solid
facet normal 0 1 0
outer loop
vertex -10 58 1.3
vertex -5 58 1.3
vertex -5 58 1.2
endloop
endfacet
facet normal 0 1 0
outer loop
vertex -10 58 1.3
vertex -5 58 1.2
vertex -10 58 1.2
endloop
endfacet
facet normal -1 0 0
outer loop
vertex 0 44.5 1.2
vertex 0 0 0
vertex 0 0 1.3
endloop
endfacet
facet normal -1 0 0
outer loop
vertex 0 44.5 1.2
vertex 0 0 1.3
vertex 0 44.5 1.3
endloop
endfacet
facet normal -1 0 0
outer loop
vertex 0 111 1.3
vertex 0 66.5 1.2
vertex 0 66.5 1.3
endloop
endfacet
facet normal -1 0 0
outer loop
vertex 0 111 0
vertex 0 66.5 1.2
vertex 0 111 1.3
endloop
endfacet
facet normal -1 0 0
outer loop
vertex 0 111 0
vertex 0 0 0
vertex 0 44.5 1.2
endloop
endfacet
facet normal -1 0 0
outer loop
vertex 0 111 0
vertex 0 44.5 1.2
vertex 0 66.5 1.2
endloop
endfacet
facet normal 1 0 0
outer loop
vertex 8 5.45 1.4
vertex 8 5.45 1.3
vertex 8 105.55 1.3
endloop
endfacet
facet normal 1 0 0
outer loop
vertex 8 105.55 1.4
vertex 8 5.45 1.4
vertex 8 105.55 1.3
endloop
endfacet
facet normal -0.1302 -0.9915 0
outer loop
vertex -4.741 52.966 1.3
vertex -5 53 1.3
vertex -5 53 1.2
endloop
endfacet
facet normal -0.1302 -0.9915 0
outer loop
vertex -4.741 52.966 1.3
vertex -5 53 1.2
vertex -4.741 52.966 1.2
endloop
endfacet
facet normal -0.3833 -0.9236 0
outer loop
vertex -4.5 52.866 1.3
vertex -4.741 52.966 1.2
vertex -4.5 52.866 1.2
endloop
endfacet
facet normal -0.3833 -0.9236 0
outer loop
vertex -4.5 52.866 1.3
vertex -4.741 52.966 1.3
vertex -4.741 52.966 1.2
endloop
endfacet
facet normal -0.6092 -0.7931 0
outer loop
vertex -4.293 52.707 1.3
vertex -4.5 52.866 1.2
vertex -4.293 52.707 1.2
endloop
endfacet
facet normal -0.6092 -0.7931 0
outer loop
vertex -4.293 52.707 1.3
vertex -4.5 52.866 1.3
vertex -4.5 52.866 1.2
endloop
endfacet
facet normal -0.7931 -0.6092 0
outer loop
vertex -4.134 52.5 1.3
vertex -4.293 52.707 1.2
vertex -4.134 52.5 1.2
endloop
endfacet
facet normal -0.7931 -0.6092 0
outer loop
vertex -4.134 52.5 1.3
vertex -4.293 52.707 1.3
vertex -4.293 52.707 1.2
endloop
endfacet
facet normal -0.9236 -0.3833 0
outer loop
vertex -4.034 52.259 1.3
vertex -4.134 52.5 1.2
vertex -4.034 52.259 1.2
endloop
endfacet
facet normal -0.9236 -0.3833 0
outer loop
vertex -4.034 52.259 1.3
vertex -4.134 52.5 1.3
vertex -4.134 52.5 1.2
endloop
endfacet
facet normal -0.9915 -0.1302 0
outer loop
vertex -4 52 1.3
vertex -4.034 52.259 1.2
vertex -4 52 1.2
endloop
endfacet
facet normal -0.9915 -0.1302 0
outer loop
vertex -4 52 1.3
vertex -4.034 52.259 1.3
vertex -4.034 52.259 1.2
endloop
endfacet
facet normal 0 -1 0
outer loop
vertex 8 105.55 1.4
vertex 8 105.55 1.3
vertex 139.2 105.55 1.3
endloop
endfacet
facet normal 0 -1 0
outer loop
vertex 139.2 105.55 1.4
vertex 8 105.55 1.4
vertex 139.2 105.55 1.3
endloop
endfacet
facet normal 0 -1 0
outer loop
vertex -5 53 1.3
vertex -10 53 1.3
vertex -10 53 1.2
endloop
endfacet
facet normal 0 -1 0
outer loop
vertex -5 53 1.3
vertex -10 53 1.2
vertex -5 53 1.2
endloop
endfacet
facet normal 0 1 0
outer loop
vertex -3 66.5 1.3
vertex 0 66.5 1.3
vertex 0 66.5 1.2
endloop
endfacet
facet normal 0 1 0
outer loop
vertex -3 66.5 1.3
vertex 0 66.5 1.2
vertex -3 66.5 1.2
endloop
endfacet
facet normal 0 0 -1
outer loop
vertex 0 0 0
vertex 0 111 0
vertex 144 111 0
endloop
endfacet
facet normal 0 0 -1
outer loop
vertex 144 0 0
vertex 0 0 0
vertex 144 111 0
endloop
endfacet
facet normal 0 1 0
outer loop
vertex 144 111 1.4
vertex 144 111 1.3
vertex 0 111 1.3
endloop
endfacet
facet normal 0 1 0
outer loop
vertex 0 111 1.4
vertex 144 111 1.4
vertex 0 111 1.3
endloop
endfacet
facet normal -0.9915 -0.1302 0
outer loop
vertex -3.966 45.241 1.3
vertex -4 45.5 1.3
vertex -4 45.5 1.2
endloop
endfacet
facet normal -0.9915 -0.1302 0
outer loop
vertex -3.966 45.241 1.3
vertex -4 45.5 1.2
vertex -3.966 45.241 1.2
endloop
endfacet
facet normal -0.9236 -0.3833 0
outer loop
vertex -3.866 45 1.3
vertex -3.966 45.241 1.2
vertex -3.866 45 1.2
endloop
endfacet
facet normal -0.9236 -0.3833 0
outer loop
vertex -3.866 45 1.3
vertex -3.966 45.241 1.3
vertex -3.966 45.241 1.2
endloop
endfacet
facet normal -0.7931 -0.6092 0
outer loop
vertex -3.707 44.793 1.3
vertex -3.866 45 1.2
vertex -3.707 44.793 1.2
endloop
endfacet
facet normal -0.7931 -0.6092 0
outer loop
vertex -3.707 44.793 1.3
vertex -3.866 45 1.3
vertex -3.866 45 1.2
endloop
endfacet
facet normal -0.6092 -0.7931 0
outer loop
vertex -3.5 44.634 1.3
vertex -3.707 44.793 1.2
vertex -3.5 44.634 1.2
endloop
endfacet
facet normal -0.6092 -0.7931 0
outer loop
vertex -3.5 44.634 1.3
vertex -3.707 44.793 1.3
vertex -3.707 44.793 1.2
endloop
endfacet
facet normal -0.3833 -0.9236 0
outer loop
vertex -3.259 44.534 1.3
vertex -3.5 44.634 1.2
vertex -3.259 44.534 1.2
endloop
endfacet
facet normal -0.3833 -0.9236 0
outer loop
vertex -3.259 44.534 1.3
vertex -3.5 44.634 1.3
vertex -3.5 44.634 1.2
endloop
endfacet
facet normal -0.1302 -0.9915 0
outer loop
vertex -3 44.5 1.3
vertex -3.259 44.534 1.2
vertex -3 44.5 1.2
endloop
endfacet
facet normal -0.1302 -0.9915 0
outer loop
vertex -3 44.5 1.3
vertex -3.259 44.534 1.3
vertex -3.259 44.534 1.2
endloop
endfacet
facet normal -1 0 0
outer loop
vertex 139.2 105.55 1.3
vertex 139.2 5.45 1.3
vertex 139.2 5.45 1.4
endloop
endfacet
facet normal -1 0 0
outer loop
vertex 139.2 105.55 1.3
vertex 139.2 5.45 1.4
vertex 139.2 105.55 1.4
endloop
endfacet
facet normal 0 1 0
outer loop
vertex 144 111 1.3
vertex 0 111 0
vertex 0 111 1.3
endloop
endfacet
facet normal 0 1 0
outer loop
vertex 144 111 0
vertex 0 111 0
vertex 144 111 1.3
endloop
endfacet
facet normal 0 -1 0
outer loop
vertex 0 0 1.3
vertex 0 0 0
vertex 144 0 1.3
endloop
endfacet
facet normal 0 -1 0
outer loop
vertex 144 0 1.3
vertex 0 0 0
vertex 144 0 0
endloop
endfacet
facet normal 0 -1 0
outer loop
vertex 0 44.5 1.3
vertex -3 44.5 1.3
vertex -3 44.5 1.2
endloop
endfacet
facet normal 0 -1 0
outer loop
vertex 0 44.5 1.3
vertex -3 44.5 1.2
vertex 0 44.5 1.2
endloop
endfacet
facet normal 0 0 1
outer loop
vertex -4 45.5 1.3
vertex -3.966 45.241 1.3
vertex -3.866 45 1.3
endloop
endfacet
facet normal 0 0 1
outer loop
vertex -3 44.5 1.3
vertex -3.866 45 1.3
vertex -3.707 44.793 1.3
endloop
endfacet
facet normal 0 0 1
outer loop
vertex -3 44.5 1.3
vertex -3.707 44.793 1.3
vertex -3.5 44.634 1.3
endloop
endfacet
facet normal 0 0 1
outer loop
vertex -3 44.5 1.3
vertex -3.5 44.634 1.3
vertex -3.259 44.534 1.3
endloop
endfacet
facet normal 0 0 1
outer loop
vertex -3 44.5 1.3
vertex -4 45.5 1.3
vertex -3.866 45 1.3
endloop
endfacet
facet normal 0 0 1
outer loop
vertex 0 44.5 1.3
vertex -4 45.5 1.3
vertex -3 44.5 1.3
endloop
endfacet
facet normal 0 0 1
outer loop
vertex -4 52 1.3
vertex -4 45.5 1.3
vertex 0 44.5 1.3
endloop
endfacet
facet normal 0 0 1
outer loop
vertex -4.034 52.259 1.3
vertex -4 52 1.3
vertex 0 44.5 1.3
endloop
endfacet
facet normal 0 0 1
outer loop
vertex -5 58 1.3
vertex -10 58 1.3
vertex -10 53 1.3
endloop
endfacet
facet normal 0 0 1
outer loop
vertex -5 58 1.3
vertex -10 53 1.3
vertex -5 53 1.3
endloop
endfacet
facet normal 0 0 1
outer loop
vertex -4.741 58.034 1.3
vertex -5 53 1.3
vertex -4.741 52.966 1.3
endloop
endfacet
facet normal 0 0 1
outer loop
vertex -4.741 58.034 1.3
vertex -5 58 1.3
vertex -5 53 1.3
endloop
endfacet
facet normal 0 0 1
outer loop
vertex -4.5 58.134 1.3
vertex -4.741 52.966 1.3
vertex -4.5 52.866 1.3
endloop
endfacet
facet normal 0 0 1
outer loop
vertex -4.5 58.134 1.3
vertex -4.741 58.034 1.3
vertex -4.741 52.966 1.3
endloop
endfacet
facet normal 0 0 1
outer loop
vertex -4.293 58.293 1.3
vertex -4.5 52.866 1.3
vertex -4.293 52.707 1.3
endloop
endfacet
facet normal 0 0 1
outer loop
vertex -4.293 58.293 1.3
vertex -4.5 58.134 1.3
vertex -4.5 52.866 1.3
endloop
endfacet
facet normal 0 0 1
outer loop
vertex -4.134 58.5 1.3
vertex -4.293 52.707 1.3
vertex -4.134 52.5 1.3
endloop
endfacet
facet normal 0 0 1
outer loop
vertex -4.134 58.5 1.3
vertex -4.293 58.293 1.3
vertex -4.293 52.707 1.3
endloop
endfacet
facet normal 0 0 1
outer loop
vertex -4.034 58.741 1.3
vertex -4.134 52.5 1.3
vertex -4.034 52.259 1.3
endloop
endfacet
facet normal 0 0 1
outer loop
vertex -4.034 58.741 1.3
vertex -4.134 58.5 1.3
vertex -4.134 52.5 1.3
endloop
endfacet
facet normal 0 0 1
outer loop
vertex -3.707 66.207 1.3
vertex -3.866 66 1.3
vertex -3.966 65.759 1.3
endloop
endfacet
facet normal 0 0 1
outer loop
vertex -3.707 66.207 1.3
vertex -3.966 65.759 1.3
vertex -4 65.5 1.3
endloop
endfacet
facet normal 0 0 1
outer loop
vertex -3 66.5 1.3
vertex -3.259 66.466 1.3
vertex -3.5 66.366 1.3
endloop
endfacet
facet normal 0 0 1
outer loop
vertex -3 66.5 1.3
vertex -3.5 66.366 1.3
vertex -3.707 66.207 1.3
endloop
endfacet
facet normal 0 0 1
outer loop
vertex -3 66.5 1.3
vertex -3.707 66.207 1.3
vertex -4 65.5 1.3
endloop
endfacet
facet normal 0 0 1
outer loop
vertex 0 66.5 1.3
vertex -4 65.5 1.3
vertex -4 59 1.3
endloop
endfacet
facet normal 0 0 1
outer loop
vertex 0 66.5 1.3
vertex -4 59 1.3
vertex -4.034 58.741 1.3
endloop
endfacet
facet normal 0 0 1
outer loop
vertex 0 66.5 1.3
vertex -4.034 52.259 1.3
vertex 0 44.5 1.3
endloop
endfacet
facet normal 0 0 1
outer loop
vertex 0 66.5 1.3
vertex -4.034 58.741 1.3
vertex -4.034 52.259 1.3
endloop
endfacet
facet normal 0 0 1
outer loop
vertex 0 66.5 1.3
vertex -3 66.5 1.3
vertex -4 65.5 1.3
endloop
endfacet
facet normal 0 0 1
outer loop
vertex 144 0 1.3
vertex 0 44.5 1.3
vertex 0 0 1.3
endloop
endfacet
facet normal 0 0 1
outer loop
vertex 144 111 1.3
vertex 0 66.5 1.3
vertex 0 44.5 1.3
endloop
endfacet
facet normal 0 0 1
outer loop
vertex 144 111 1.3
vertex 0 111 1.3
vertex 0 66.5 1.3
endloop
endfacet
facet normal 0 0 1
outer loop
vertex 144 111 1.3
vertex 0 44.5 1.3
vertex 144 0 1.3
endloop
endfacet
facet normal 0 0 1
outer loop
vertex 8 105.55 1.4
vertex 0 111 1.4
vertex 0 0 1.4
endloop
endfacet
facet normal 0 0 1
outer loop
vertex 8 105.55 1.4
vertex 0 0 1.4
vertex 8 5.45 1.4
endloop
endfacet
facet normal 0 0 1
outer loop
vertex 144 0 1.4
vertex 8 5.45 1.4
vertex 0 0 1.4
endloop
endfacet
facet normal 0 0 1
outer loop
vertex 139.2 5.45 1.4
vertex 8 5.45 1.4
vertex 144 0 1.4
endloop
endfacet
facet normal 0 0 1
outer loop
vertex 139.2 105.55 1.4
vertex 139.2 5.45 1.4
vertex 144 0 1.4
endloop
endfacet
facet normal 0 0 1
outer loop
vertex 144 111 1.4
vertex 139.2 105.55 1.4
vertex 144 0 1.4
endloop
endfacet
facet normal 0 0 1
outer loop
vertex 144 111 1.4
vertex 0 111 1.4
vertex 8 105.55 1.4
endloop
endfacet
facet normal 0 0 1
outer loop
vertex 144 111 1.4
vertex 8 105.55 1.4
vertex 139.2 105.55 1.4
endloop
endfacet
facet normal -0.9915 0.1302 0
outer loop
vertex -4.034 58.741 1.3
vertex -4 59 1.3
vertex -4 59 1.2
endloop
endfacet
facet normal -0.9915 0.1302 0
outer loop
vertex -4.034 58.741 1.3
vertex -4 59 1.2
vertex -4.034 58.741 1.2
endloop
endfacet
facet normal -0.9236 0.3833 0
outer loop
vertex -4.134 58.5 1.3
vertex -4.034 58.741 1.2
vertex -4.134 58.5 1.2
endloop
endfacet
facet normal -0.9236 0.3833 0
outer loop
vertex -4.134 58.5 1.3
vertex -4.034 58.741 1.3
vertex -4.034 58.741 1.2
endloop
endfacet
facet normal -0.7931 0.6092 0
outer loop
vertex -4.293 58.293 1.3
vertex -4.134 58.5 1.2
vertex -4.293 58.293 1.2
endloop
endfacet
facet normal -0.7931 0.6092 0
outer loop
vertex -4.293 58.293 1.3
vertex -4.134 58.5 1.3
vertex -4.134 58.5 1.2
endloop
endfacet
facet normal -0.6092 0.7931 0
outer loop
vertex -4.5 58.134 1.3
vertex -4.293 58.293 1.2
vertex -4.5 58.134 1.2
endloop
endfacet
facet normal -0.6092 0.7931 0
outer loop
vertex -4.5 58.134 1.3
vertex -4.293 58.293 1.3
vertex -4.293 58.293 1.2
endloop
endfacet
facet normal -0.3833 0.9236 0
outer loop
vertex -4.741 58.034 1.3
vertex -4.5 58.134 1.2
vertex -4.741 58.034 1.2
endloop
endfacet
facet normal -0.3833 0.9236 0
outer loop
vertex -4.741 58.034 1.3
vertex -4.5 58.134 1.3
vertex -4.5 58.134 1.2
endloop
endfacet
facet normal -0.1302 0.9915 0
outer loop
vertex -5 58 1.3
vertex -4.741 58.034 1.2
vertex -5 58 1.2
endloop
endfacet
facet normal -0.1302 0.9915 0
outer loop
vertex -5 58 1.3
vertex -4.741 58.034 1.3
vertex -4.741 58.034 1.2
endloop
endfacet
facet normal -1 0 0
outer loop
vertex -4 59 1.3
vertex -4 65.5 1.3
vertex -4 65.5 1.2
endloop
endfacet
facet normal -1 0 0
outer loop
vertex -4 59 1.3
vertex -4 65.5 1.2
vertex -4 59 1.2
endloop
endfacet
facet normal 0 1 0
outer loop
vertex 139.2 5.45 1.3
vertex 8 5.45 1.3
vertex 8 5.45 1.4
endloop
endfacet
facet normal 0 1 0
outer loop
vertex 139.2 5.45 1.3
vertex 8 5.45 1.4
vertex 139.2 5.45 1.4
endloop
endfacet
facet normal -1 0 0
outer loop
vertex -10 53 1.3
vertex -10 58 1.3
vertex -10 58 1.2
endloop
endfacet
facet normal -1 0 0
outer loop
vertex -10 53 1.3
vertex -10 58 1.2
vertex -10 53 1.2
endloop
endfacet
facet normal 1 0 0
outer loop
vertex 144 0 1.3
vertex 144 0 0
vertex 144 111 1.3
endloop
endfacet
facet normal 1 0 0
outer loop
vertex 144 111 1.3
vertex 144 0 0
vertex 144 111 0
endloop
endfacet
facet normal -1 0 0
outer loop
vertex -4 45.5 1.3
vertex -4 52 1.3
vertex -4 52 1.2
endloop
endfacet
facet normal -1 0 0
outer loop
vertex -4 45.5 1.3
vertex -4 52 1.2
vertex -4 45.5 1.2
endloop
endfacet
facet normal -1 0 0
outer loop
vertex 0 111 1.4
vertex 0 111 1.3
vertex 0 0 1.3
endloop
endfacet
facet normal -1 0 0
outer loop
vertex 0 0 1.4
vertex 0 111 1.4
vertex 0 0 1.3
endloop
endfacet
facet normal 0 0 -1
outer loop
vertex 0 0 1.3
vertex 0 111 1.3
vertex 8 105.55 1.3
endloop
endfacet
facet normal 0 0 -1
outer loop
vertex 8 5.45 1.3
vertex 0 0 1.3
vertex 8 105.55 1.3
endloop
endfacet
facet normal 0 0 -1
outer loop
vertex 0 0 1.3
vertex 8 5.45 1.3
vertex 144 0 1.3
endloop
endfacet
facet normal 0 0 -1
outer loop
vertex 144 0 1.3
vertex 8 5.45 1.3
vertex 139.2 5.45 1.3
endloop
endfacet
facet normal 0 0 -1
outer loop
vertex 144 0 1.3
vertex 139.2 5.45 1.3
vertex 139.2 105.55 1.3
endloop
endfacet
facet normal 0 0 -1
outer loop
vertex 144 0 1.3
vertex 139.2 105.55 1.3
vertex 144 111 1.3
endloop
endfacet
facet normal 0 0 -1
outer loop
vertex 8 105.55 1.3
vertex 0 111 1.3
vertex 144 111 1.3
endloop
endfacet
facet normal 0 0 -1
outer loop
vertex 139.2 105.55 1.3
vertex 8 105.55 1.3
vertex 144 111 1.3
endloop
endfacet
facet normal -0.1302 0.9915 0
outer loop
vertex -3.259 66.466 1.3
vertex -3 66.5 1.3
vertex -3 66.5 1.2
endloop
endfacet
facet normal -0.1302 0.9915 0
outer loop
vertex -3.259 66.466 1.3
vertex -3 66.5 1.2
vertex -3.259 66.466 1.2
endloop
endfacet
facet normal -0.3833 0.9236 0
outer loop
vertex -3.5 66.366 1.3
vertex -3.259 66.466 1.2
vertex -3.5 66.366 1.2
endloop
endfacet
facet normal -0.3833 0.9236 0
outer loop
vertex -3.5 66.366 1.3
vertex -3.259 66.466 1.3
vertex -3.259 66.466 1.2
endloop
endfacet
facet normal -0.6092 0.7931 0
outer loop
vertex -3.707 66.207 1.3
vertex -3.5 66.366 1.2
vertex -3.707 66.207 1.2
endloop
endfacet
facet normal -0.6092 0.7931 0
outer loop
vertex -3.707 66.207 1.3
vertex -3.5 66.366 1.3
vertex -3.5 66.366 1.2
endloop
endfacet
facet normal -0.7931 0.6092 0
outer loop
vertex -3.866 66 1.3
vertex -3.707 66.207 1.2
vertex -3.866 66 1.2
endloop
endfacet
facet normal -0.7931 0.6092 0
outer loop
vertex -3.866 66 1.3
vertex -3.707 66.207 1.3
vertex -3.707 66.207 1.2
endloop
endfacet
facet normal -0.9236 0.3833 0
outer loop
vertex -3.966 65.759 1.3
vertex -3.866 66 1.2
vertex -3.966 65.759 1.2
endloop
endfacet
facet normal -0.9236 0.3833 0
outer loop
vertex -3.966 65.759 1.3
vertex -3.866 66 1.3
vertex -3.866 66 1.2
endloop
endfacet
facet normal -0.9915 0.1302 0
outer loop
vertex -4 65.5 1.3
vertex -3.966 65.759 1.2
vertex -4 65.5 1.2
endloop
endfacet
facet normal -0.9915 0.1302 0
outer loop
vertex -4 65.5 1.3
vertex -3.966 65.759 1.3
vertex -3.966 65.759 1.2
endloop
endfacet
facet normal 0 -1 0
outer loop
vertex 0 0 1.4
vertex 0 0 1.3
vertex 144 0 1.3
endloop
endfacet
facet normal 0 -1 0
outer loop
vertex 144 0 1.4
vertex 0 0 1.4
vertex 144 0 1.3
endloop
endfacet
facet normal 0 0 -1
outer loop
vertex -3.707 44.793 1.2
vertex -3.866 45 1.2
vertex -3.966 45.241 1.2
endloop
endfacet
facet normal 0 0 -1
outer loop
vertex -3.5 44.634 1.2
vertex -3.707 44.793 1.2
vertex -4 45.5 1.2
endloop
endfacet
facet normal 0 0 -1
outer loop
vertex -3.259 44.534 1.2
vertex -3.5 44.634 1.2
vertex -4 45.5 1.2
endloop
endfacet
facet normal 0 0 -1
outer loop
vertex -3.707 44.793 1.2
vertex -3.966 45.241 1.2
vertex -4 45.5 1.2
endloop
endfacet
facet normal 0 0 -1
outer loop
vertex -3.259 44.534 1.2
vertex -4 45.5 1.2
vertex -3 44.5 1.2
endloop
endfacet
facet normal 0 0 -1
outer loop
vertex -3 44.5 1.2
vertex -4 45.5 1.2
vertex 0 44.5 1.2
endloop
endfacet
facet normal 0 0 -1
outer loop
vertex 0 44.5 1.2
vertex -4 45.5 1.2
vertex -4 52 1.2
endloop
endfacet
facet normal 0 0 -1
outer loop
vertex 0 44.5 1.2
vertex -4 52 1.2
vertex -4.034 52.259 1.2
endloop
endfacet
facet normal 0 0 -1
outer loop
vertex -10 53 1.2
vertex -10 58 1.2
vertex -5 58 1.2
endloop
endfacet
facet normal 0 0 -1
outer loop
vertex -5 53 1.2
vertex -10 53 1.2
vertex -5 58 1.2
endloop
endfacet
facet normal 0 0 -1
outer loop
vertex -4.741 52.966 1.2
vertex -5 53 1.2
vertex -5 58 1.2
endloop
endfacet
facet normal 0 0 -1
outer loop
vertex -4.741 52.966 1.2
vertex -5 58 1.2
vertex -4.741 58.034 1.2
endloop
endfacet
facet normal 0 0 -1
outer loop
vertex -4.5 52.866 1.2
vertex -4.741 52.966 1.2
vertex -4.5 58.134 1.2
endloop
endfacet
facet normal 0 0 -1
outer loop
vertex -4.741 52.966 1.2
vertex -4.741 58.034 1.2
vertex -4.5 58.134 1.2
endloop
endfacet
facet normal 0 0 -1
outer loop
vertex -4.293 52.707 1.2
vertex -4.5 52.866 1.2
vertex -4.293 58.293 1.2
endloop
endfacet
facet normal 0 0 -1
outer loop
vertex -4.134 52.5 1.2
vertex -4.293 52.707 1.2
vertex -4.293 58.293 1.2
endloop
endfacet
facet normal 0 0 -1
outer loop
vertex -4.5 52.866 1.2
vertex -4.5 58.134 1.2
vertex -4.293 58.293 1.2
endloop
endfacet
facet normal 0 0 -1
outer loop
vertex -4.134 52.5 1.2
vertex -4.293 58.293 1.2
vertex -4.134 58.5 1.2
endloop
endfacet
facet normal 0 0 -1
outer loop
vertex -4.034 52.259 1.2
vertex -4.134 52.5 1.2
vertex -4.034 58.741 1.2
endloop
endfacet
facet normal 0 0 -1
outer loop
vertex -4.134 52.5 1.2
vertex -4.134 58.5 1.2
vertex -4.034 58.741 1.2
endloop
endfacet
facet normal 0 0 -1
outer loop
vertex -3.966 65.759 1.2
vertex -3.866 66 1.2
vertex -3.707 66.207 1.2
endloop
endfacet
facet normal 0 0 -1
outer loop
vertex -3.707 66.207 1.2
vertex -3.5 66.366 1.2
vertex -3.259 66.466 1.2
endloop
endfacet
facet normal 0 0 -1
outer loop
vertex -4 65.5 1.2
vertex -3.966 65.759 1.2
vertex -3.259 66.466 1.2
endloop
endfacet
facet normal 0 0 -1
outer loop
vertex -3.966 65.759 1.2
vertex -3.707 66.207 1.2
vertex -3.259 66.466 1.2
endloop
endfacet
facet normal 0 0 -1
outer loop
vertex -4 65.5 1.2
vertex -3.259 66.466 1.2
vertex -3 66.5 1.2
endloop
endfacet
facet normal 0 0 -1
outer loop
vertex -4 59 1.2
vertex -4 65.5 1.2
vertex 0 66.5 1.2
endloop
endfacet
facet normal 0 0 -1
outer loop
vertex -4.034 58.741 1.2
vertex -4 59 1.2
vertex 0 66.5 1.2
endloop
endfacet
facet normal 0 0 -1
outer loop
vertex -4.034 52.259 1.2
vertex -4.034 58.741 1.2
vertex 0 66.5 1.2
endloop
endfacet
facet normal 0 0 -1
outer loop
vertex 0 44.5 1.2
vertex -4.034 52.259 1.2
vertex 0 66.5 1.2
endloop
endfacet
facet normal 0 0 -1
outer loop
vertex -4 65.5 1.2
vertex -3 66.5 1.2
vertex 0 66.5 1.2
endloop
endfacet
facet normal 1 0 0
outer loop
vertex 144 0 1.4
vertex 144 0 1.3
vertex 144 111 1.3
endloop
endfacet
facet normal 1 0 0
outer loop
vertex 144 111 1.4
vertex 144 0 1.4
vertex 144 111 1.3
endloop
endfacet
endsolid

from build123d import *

# Parameters (mm, degrees)
SKETCH1_W           = 144
SKETCH1_H           = 111
BOSS_EXTRUDE1_DEPTH = 1.3
BOSS_EXTRUDE2_DEPTH = 0.1
SKETCH5_W           = 131.2
SKETCH5_H           = 100.1
BOSS_EXTRUDE3_DEPTH = 0.1


with BuildPart() as part:
    # Sketch1 → Boss-Extrude1 (new body)
    with BuildSketch(Plane.XY):
        with Locations((72, 55.5)):
            Rectangle(SKETCH1_W, SKETCH1_H)
    extrude(amount=BOSS_EXTRUDE1_DEPTH)

    # Sketch2 → Boss-Extrude2 (add)
    with BuildSketch(Plane.XY.offset(1.3)):
        with BuildLine():
            Line((0, 66.5), (-3, 66.5))
            ThreePointArc((-3, 66.5), (-3.707106781, 66.207106781), (-4, 65.5))
            Line((-4, 65.5), (-4, 59))
            ThreePointArc((-4, 59), (-4.292893219, 58.292893219), (-5, 58))
            Line((-5, 58), (-10, 58))
            Line((-10, 58), (-10, 53))
            Line((-10, 53), (-5, 53))
            ThreePointArc((-5, 53), (-4.292893219, 52.707106781), (-4, 52))
            Line((-4, 52), (-4, 45.5))
            ThreePointArc((-4, 45.5), (-3.707106781, 44.792893219), (-3, 44.5))
            Line((-3, 44.5), (0, 44.5))
            Line((0, 44.5), (0, 66.5))
        make_face()
    extrude(amount=-BOSS_EXTRUDE2_DEPTH)


with BuildPart() as body_2:
    # Sketch5 → Boss-Extrude3 (new body)
    with BuildSketch(Plane.XY.offset(1.3)):
        Polygon((144, 111), (0, 111), (0, 66.5), (0, 44.5), (0, 0), (144, 0), align=None)
        with Locations((73.6, 55.5)):
            Rectangle(SKETCH5_W, SKETCH5_H, mode=Mode.SUBTRACT)
    extrude(amount=BOSS_EXTRUDE3_DEPTH)


solid = Compound([part.part, body_2.part])
